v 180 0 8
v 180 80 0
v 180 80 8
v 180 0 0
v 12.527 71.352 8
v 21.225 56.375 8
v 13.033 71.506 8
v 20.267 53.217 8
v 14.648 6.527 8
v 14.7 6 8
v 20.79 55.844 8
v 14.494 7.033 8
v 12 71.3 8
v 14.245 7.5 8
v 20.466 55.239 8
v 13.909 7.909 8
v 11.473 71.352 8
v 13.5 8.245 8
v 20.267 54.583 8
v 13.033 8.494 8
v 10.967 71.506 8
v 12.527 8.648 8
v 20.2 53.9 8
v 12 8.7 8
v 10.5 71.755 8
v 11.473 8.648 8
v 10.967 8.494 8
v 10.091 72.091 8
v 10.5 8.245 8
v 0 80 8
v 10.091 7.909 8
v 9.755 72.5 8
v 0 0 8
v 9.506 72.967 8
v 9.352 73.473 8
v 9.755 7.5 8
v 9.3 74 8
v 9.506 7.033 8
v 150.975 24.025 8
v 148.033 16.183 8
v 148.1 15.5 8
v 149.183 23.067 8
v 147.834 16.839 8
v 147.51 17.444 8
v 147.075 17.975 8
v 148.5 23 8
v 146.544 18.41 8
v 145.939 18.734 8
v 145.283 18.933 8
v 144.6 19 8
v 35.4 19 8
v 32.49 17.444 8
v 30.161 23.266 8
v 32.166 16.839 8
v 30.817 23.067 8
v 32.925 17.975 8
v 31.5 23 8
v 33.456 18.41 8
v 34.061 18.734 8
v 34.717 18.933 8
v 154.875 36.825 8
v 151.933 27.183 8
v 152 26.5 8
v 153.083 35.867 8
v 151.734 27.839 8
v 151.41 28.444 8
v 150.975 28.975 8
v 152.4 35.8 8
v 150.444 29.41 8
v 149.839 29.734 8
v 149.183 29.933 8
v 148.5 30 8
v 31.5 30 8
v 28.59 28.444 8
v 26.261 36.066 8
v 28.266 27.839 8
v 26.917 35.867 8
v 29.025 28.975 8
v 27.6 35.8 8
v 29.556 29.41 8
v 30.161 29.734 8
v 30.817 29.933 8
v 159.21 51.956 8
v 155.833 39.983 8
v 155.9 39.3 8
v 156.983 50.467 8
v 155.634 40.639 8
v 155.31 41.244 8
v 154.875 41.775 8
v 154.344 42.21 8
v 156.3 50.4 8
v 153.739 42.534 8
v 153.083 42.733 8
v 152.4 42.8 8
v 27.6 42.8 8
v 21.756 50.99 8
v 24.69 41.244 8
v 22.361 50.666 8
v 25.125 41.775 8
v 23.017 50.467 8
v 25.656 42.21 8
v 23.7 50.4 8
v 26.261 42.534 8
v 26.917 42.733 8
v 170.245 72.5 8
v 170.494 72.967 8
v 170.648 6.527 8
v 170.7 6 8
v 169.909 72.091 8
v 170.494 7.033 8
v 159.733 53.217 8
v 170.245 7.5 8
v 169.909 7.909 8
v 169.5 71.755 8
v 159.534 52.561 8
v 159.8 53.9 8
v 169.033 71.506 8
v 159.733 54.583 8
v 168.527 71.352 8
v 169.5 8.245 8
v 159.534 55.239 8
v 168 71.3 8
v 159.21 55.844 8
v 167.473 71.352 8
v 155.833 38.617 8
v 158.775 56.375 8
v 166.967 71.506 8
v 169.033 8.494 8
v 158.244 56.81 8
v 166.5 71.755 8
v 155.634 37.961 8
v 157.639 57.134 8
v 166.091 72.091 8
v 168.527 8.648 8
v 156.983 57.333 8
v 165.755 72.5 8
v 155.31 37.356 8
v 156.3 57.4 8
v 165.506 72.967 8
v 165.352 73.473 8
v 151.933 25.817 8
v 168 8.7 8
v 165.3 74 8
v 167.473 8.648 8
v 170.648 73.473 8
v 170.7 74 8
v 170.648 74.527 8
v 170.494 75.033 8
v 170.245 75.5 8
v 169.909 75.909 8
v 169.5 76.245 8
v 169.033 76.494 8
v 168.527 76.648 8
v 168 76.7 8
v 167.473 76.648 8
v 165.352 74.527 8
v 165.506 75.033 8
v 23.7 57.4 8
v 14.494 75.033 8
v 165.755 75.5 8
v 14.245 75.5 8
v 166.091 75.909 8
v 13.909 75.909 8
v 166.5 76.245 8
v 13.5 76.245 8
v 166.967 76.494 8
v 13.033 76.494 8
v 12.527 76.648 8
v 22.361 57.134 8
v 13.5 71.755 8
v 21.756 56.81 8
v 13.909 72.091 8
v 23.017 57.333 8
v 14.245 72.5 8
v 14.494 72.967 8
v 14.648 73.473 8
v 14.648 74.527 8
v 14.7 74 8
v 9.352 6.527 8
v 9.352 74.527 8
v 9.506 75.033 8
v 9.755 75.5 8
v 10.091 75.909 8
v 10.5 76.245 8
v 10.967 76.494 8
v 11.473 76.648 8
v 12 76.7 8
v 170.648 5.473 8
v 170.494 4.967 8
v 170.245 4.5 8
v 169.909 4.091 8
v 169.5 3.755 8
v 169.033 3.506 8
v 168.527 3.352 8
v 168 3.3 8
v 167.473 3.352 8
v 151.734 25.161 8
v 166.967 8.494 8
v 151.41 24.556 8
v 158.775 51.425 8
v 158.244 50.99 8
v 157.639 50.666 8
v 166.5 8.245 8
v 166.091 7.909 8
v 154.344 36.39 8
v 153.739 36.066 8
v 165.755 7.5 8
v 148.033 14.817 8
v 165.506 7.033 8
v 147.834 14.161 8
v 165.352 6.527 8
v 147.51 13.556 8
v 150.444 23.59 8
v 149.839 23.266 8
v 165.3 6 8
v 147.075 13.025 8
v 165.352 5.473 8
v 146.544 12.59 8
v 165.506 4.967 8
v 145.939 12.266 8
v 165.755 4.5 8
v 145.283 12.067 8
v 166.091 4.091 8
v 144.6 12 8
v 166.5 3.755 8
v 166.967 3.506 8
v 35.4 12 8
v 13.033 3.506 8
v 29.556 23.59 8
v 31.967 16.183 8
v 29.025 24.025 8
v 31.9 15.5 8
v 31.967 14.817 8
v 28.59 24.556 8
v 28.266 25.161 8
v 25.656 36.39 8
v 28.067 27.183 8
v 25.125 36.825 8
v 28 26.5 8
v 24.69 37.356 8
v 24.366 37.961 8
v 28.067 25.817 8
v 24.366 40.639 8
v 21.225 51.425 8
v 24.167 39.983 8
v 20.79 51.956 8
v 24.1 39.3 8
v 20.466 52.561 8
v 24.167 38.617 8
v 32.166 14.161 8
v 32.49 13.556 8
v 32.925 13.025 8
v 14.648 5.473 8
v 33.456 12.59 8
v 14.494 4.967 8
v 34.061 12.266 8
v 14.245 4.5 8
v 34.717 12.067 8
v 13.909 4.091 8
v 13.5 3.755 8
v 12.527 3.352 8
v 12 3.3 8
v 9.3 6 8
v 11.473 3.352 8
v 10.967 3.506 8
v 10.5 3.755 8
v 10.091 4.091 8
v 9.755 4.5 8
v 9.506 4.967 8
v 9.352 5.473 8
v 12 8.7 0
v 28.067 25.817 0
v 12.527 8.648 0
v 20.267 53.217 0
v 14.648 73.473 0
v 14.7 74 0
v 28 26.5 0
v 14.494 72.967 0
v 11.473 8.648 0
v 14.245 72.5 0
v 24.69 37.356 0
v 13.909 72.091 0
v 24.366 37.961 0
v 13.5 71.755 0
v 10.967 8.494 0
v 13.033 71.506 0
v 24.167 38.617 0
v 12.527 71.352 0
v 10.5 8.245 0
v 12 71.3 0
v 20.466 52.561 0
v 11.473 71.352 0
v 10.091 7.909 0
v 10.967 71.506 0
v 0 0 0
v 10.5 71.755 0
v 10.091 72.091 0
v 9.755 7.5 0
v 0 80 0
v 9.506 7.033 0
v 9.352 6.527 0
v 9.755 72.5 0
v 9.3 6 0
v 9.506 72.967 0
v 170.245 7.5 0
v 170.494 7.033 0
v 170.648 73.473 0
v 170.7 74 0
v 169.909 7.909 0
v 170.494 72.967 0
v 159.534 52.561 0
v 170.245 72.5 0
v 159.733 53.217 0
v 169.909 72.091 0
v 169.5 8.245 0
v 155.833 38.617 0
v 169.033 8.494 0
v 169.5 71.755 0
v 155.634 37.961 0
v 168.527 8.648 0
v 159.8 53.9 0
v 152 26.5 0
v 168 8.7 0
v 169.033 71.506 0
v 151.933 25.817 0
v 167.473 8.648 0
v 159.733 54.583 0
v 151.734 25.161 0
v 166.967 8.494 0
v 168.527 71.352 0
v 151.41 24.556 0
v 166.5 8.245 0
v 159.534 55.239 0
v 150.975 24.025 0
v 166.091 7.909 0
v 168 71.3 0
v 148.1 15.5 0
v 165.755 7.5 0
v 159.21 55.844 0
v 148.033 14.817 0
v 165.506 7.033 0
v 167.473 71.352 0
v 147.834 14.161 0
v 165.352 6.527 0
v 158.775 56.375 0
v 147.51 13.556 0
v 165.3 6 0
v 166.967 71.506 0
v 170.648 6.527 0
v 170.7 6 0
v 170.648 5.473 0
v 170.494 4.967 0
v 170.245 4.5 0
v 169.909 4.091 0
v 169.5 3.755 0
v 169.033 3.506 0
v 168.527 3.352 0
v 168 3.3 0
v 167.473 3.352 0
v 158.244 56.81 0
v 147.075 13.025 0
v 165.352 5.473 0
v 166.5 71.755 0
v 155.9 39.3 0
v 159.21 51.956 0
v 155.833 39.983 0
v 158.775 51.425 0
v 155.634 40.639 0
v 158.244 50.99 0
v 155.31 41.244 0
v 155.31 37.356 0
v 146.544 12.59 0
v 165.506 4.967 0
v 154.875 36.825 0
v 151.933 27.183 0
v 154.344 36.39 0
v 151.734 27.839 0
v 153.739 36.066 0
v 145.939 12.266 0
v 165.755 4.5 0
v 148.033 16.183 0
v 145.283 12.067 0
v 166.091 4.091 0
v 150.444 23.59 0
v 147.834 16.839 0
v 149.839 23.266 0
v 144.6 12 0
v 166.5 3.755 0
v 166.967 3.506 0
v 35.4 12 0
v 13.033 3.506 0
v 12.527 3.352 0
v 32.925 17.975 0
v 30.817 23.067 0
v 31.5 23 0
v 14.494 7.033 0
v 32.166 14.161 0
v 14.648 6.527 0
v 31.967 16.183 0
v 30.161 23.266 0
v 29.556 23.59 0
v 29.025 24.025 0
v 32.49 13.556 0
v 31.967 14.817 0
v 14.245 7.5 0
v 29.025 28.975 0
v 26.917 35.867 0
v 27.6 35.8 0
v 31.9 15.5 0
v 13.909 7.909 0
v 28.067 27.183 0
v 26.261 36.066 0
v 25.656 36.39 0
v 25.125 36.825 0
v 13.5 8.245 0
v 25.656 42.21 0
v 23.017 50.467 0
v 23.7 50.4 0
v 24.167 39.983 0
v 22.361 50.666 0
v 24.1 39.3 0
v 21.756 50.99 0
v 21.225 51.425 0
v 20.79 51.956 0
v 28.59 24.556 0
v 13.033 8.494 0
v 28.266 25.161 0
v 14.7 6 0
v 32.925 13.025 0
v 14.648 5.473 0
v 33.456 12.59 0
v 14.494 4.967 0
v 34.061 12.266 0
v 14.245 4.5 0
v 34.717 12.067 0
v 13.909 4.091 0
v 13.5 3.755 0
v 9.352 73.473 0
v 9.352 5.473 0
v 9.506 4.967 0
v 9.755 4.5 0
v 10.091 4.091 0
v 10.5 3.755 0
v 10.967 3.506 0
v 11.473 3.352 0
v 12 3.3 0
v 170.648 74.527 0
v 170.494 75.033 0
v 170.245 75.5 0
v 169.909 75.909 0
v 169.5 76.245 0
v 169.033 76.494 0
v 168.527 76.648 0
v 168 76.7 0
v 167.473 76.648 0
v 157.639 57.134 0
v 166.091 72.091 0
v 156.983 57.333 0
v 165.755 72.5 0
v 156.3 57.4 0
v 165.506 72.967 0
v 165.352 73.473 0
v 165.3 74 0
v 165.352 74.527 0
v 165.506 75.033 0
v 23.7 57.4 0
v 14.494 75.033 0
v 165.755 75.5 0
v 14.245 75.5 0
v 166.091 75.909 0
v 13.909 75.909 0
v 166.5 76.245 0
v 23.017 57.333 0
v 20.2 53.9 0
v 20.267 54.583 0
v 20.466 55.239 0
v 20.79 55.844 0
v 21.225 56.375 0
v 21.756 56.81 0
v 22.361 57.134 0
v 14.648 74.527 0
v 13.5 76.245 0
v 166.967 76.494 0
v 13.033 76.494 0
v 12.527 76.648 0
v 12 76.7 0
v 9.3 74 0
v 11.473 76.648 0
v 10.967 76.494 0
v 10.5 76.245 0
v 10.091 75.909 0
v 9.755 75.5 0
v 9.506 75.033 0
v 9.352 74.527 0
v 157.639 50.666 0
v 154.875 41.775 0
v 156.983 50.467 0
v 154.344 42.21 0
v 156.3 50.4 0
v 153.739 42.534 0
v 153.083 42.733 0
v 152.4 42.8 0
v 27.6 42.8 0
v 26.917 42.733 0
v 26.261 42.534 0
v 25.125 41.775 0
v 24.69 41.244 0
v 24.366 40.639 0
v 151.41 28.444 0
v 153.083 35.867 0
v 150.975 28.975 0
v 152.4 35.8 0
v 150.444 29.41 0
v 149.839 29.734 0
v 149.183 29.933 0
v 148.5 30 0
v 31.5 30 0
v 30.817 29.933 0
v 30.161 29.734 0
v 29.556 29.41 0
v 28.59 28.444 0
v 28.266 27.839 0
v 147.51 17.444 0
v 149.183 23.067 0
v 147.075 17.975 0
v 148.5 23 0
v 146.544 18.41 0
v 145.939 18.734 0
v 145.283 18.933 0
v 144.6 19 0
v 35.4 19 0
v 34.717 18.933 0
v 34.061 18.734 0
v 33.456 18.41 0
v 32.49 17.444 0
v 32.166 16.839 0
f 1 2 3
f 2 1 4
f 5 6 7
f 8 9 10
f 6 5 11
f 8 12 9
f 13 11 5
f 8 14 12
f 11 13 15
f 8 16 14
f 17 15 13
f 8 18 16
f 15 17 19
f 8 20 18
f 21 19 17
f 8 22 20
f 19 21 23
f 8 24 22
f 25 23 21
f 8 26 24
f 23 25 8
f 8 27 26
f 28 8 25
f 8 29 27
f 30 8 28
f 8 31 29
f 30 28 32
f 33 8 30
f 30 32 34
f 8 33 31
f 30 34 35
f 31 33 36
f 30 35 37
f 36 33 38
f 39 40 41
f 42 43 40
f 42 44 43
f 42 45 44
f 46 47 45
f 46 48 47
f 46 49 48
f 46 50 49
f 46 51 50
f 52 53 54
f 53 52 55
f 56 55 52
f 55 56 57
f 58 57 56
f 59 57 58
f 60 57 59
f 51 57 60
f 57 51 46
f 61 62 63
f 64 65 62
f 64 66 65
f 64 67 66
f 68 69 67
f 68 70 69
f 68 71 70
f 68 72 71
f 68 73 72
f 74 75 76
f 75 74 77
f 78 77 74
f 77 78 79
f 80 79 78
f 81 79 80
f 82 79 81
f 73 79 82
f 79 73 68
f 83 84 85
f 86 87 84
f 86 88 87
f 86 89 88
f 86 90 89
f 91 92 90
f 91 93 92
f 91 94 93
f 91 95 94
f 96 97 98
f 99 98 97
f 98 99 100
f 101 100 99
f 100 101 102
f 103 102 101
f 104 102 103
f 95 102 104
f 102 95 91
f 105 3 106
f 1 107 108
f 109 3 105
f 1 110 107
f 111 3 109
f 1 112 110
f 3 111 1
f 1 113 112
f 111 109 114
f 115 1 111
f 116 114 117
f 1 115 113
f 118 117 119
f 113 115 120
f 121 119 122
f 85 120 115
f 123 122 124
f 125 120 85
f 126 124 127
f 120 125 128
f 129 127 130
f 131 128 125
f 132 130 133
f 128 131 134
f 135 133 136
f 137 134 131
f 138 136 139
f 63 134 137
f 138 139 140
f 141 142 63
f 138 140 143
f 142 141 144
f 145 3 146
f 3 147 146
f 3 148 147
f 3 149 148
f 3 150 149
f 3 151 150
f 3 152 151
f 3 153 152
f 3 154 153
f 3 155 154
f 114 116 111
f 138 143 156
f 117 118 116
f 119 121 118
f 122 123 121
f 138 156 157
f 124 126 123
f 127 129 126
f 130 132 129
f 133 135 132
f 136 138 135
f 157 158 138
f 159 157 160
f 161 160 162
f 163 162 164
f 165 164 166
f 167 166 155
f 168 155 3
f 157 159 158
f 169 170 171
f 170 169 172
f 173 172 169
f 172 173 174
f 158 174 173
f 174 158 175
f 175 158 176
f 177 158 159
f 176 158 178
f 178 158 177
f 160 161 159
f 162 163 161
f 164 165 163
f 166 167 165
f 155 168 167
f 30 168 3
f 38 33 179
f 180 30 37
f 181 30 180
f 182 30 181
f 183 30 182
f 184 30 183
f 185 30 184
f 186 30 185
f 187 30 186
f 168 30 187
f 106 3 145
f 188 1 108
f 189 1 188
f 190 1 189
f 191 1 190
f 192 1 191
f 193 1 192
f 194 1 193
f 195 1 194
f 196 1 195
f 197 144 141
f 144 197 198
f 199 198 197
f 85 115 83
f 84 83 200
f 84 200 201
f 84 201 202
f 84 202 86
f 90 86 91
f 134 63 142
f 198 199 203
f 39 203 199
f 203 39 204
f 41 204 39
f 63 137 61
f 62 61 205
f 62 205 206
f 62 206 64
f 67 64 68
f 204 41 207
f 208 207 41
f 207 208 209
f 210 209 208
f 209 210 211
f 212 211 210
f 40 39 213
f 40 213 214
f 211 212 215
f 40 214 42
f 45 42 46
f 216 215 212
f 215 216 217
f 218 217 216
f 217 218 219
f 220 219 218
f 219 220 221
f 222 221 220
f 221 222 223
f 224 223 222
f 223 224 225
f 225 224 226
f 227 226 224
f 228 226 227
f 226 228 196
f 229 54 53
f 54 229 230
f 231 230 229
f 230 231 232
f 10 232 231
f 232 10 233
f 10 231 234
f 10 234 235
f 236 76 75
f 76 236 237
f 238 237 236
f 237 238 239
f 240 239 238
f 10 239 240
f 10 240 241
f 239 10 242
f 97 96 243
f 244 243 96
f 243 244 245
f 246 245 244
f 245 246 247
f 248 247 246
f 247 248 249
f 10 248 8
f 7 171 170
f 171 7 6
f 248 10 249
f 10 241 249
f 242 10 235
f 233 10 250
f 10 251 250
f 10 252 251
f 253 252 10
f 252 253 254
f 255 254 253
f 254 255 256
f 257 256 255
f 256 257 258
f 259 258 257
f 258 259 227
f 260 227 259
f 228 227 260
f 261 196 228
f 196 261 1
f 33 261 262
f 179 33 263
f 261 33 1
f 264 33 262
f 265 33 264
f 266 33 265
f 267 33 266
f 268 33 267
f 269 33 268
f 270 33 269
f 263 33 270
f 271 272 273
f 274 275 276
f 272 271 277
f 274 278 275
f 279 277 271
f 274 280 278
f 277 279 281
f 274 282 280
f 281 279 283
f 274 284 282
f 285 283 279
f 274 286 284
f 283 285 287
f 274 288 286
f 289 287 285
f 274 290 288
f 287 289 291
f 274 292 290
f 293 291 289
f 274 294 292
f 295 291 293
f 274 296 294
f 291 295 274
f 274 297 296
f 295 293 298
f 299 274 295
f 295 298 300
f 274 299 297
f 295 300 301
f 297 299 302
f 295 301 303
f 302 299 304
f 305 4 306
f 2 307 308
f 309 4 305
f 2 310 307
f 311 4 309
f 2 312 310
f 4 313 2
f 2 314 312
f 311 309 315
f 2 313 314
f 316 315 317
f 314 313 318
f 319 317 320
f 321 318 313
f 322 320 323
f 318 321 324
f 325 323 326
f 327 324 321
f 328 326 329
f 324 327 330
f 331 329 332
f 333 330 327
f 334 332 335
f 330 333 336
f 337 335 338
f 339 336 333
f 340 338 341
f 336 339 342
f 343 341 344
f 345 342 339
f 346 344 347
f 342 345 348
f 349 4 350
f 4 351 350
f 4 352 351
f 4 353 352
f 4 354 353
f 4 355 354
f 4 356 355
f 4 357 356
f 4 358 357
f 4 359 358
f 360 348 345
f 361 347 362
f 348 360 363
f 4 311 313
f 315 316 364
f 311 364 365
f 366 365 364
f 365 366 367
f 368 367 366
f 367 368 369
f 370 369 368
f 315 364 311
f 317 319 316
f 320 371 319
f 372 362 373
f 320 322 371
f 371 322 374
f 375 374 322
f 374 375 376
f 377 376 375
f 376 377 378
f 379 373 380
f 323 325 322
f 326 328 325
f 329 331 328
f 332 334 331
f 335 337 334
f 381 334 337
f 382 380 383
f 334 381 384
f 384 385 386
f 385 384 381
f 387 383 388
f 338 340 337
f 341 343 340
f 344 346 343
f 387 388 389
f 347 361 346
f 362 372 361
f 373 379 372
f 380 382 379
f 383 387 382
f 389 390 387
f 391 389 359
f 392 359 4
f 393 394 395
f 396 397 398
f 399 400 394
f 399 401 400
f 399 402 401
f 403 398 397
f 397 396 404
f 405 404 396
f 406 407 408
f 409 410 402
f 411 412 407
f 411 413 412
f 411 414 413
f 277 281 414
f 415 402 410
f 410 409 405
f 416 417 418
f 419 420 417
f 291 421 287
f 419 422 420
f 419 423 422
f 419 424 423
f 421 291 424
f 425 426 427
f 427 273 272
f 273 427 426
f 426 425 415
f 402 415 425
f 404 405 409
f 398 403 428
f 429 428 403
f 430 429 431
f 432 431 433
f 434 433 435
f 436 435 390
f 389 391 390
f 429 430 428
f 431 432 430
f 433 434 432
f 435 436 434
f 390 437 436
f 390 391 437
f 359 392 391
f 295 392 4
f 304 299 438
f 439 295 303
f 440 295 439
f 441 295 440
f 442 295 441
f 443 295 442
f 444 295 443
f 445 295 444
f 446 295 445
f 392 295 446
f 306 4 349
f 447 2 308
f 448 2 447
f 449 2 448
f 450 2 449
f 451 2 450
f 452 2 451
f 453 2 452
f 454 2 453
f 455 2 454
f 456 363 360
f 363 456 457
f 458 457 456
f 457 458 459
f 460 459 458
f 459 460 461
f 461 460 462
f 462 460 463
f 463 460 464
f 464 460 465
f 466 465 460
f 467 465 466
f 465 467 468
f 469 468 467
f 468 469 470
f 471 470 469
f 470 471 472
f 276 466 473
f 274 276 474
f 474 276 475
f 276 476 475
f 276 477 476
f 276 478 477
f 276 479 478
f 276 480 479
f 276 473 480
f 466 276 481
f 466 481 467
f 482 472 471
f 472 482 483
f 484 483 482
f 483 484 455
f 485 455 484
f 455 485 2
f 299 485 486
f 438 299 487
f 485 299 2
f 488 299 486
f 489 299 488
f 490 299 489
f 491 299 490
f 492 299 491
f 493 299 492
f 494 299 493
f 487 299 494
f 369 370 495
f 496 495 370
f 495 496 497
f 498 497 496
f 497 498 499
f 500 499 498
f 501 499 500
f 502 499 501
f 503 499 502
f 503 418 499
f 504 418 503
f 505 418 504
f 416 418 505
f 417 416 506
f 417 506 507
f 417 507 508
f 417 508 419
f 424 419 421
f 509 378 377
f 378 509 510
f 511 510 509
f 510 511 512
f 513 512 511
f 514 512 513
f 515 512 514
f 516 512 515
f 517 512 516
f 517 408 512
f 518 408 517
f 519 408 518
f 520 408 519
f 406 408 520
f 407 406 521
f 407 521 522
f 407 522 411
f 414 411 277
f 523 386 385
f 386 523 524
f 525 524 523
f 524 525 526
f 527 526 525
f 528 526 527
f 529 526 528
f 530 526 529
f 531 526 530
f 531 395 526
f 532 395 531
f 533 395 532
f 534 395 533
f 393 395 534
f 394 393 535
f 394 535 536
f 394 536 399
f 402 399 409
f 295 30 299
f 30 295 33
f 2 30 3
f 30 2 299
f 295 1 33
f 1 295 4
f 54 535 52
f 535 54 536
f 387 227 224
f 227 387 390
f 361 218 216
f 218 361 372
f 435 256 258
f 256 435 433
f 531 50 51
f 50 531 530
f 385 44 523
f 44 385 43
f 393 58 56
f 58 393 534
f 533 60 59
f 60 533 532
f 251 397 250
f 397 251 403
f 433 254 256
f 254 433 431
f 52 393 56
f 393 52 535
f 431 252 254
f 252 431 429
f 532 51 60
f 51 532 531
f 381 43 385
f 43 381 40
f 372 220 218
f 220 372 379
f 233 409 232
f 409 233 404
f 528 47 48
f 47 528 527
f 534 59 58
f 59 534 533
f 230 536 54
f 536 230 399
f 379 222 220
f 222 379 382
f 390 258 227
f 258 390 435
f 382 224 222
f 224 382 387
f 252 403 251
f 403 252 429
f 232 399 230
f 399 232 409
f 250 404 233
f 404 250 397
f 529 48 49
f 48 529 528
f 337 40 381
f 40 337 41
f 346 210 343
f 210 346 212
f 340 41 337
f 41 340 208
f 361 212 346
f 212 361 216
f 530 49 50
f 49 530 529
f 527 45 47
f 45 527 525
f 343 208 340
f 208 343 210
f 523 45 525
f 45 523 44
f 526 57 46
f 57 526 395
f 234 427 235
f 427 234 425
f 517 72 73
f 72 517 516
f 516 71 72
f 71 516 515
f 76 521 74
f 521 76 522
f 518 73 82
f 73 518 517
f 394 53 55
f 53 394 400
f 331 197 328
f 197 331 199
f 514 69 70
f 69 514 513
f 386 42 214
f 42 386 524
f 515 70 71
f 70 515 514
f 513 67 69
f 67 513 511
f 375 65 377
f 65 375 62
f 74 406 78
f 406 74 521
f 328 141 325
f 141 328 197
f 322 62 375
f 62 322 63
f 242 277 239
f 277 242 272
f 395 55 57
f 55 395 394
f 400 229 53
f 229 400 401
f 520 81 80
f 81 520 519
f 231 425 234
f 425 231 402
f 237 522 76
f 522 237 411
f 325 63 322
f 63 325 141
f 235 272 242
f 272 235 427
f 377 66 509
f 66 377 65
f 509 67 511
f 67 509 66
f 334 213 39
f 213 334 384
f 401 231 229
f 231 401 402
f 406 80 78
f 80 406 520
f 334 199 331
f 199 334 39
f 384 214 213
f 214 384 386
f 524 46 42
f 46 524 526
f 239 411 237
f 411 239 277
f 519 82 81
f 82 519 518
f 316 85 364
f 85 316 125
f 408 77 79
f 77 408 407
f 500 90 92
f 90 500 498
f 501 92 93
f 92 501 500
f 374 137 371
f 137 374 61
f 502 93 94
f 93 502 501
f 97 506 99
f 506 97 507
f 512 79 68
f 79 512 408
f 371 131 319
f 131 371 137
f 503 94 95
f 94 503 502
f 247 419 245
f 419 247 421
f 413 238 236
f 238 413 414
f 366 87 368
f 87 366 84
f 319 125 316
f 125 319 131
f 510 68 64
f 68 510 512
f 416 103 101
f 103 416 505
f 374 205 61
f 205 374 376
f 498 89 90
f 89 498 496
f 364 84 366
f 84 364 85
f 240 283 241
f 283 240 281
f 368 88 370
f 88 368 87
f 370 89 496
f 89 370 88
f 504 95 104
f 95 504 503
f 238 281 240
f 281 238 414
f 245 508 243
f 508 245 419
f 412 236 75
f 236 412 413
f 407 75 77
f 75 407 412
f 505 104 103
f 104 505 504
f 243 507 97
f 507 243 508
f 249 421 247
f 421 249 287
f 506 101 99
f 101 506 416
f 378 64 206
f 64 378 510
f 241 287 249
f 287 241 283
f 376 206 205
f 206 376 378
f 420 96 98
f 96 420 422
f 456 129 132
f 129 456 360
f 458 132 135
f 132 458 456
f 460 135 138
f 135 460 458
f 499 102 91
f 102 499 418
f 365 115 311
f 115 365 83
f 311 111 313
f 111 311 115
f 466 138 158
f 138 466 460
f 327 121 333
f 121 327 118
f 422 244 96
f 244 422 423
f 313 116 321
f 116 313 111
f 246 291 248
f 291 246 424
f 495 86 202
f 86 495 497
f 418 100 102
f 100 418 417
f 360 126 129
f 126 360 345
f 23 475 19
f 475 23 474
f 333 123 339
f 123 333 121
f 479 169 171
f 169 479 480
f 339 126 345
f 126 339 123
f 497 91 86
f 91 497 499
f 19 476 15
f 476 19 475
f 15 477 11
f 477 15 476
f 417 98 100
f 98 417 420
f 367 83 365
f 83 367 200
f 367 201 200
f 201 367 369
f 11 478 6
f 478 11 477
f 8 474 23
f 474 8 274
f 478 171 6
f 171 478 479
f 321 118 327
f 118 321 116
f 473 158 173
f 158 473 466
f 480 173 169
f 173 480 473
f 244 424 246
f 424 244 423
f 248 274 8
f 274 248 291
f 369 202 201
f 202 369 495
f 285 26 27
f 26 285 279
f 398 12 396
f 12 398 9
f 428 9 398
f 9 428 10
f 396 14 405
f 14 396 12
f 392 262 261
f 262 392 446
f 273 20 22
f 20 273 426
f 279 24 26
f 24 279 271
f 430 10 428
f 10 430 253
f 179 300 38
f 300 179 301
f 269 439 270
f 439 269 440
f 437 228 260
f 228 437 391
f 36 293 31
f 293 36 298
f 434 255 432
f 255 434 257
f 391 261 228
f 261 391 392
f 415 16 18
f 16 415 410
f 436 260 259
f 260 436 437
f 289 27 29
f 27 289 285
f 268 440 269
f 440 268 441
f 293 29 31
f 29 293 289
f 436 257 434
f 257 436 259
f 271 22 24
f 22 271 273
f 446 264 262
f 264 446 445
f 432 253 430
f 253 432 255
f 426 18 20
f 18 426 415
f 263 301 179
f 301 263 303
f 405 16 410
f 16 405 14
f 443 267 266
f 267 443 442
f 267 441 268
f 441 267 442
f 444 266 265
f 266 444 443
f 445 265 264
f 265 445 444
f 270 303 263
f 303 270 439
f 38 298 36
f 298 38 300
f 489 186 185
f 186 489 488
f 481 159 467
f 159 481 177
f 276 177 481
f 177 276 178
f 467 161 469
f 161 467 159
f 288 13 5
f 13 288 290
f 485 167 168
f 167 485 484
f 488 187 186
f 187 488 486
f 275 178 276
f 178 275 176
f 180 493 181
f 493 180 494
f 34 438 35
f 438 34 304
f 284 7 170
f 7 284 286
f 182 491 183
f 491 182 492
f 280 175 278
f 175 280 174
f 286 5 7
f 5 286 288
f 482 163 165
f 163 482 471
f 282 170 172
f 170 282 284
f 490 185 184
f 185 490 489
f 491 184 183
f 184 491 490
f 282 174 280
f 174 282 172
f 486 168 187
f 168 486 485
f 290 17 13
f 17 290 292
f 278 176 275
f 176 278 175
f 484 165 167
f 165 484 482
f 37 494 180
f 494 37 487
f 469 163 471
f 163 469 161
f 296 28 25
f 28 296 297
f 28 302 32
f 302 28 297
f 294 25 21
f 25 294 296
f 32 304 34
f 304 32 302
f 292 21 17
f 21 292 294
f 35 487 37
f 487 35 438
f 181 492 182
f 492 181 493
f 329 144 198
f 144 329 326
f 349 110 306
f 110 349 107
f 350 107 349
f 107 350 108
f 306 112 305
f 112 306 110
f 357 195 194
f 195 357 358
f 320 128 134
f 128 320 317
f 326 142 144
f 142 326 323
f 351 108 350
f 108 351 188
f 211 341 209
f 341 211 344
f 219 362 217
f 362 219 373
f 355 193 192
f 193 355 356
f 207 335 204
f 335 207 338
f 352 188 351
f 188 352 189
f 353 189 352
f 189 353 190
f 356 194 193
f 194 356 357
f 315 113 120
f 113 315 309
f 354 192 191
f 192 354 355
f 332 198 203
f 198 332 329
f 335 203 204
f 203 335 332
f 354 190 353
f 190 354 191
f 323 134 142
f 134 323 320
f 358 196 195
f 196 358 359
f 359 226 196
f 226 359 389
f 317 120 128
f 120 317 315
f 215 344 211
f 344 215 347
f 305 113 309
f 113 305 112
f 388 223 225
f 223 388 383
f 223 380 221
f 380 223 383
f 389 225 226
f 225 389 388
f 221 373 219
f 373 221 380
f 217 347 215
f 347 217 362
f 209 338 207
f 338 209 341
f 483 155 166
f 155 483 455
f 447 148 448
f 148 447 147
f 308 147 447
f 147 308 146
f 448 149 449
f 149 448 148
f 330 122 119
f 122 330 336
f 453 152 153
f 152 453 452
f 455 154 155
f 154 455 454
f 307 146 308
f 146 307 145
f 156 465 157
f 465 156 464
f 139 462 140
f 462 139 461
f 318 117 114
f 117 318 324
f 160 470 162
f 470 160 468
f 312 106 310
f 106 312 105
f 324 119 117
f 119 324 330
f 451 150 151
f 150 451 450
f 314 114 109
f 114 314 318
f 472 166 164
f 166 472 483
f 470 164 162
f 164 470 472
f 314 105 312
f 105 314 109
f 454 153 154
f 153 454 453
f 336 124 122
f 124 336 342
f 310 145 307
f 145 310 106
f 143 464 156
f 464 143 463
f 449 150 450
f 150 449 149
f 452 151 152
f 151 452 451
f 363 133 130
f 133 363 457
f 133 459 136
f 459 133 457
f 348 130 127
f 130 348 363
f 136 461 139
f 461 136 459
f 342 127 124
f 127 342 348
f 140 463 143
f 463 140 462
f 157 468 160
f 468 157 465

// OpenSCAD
$fn = 32;

// ----------------------------------------------------------------------
// Slotted panel: 180 x 80 mm, 4 ряда of slots
// ----------------------------------------------------------------------

// --- parameters (mm) ---
panel_w = 180;            // panel width
panel_d = 80;             // panel depth
thick = 8;                // panel thickness
slot_w = 7;               // slot width
pitch0 = 11;              // first row pitch
pitch_step = 1.8;         // pitch increase per row
margin = 12;              // margin around the slot field
rows = 4;                 // number of slot rows
mount_d = 5.4;            // mounting holes
mount_x = 78;             // mounting hole offset

difference() {
  union() {
    cube([panel_w, panel_d, thick]);
  }
  /* slot rows: stadium shaped cutters, 2.5 mm clear of both faces */
  /* row 0: pitch 11, length 109.2 */
  hull() {
    translate([35.4, 15.5, -2.5]) cylinder(h = thick + 5, d = slot_w);
    translate([144.6, 15.5, -2.5]) cylinder(h = thick + 5, d = slot_w);
  }
  /* row 1: pitch 12.8, length 117 */
  hull() {
    translate([31.5, 26.5, -2.5]) cylinder(h = thick + 5, d = slot_w);
    translate([148.5, 26.5, -2.5]) cylinder(h = thick + 5, d = slot_w);
  }
  /* row 2: pitch 14.6, length 124.8 */
  hull() {
    translate([27.6, 39.3, -2.5]) cylinder(h = thick + 5, d = slot_w);
    translate([152.4, 39.3, -2.5]) cylinder(h = thick + 5, d = slot_w);
  }
  /* row 3: pitch 16.4, length 132.6 */
  hull() {
    translate([23.7, 53.9, -2.5]) cylinder(h = thick + 5, d = slot_w);
    translate([156.3, 53.9, -2.5]) cylinder(h = thick + 5, d = slot_w);
  }
  translate([12, 6, -2.5]) cylinder(h = 13, d = mount_d);
  translate([12, 74, -2.5]) cylinder(h = 13, d = mount_d);
  translate([168, 6, -2.5]) cylinder(h = 13, d = mount_d);
  translate([168, 74, -2.5]) cylinder(h = 13, d = mount_d);
}
